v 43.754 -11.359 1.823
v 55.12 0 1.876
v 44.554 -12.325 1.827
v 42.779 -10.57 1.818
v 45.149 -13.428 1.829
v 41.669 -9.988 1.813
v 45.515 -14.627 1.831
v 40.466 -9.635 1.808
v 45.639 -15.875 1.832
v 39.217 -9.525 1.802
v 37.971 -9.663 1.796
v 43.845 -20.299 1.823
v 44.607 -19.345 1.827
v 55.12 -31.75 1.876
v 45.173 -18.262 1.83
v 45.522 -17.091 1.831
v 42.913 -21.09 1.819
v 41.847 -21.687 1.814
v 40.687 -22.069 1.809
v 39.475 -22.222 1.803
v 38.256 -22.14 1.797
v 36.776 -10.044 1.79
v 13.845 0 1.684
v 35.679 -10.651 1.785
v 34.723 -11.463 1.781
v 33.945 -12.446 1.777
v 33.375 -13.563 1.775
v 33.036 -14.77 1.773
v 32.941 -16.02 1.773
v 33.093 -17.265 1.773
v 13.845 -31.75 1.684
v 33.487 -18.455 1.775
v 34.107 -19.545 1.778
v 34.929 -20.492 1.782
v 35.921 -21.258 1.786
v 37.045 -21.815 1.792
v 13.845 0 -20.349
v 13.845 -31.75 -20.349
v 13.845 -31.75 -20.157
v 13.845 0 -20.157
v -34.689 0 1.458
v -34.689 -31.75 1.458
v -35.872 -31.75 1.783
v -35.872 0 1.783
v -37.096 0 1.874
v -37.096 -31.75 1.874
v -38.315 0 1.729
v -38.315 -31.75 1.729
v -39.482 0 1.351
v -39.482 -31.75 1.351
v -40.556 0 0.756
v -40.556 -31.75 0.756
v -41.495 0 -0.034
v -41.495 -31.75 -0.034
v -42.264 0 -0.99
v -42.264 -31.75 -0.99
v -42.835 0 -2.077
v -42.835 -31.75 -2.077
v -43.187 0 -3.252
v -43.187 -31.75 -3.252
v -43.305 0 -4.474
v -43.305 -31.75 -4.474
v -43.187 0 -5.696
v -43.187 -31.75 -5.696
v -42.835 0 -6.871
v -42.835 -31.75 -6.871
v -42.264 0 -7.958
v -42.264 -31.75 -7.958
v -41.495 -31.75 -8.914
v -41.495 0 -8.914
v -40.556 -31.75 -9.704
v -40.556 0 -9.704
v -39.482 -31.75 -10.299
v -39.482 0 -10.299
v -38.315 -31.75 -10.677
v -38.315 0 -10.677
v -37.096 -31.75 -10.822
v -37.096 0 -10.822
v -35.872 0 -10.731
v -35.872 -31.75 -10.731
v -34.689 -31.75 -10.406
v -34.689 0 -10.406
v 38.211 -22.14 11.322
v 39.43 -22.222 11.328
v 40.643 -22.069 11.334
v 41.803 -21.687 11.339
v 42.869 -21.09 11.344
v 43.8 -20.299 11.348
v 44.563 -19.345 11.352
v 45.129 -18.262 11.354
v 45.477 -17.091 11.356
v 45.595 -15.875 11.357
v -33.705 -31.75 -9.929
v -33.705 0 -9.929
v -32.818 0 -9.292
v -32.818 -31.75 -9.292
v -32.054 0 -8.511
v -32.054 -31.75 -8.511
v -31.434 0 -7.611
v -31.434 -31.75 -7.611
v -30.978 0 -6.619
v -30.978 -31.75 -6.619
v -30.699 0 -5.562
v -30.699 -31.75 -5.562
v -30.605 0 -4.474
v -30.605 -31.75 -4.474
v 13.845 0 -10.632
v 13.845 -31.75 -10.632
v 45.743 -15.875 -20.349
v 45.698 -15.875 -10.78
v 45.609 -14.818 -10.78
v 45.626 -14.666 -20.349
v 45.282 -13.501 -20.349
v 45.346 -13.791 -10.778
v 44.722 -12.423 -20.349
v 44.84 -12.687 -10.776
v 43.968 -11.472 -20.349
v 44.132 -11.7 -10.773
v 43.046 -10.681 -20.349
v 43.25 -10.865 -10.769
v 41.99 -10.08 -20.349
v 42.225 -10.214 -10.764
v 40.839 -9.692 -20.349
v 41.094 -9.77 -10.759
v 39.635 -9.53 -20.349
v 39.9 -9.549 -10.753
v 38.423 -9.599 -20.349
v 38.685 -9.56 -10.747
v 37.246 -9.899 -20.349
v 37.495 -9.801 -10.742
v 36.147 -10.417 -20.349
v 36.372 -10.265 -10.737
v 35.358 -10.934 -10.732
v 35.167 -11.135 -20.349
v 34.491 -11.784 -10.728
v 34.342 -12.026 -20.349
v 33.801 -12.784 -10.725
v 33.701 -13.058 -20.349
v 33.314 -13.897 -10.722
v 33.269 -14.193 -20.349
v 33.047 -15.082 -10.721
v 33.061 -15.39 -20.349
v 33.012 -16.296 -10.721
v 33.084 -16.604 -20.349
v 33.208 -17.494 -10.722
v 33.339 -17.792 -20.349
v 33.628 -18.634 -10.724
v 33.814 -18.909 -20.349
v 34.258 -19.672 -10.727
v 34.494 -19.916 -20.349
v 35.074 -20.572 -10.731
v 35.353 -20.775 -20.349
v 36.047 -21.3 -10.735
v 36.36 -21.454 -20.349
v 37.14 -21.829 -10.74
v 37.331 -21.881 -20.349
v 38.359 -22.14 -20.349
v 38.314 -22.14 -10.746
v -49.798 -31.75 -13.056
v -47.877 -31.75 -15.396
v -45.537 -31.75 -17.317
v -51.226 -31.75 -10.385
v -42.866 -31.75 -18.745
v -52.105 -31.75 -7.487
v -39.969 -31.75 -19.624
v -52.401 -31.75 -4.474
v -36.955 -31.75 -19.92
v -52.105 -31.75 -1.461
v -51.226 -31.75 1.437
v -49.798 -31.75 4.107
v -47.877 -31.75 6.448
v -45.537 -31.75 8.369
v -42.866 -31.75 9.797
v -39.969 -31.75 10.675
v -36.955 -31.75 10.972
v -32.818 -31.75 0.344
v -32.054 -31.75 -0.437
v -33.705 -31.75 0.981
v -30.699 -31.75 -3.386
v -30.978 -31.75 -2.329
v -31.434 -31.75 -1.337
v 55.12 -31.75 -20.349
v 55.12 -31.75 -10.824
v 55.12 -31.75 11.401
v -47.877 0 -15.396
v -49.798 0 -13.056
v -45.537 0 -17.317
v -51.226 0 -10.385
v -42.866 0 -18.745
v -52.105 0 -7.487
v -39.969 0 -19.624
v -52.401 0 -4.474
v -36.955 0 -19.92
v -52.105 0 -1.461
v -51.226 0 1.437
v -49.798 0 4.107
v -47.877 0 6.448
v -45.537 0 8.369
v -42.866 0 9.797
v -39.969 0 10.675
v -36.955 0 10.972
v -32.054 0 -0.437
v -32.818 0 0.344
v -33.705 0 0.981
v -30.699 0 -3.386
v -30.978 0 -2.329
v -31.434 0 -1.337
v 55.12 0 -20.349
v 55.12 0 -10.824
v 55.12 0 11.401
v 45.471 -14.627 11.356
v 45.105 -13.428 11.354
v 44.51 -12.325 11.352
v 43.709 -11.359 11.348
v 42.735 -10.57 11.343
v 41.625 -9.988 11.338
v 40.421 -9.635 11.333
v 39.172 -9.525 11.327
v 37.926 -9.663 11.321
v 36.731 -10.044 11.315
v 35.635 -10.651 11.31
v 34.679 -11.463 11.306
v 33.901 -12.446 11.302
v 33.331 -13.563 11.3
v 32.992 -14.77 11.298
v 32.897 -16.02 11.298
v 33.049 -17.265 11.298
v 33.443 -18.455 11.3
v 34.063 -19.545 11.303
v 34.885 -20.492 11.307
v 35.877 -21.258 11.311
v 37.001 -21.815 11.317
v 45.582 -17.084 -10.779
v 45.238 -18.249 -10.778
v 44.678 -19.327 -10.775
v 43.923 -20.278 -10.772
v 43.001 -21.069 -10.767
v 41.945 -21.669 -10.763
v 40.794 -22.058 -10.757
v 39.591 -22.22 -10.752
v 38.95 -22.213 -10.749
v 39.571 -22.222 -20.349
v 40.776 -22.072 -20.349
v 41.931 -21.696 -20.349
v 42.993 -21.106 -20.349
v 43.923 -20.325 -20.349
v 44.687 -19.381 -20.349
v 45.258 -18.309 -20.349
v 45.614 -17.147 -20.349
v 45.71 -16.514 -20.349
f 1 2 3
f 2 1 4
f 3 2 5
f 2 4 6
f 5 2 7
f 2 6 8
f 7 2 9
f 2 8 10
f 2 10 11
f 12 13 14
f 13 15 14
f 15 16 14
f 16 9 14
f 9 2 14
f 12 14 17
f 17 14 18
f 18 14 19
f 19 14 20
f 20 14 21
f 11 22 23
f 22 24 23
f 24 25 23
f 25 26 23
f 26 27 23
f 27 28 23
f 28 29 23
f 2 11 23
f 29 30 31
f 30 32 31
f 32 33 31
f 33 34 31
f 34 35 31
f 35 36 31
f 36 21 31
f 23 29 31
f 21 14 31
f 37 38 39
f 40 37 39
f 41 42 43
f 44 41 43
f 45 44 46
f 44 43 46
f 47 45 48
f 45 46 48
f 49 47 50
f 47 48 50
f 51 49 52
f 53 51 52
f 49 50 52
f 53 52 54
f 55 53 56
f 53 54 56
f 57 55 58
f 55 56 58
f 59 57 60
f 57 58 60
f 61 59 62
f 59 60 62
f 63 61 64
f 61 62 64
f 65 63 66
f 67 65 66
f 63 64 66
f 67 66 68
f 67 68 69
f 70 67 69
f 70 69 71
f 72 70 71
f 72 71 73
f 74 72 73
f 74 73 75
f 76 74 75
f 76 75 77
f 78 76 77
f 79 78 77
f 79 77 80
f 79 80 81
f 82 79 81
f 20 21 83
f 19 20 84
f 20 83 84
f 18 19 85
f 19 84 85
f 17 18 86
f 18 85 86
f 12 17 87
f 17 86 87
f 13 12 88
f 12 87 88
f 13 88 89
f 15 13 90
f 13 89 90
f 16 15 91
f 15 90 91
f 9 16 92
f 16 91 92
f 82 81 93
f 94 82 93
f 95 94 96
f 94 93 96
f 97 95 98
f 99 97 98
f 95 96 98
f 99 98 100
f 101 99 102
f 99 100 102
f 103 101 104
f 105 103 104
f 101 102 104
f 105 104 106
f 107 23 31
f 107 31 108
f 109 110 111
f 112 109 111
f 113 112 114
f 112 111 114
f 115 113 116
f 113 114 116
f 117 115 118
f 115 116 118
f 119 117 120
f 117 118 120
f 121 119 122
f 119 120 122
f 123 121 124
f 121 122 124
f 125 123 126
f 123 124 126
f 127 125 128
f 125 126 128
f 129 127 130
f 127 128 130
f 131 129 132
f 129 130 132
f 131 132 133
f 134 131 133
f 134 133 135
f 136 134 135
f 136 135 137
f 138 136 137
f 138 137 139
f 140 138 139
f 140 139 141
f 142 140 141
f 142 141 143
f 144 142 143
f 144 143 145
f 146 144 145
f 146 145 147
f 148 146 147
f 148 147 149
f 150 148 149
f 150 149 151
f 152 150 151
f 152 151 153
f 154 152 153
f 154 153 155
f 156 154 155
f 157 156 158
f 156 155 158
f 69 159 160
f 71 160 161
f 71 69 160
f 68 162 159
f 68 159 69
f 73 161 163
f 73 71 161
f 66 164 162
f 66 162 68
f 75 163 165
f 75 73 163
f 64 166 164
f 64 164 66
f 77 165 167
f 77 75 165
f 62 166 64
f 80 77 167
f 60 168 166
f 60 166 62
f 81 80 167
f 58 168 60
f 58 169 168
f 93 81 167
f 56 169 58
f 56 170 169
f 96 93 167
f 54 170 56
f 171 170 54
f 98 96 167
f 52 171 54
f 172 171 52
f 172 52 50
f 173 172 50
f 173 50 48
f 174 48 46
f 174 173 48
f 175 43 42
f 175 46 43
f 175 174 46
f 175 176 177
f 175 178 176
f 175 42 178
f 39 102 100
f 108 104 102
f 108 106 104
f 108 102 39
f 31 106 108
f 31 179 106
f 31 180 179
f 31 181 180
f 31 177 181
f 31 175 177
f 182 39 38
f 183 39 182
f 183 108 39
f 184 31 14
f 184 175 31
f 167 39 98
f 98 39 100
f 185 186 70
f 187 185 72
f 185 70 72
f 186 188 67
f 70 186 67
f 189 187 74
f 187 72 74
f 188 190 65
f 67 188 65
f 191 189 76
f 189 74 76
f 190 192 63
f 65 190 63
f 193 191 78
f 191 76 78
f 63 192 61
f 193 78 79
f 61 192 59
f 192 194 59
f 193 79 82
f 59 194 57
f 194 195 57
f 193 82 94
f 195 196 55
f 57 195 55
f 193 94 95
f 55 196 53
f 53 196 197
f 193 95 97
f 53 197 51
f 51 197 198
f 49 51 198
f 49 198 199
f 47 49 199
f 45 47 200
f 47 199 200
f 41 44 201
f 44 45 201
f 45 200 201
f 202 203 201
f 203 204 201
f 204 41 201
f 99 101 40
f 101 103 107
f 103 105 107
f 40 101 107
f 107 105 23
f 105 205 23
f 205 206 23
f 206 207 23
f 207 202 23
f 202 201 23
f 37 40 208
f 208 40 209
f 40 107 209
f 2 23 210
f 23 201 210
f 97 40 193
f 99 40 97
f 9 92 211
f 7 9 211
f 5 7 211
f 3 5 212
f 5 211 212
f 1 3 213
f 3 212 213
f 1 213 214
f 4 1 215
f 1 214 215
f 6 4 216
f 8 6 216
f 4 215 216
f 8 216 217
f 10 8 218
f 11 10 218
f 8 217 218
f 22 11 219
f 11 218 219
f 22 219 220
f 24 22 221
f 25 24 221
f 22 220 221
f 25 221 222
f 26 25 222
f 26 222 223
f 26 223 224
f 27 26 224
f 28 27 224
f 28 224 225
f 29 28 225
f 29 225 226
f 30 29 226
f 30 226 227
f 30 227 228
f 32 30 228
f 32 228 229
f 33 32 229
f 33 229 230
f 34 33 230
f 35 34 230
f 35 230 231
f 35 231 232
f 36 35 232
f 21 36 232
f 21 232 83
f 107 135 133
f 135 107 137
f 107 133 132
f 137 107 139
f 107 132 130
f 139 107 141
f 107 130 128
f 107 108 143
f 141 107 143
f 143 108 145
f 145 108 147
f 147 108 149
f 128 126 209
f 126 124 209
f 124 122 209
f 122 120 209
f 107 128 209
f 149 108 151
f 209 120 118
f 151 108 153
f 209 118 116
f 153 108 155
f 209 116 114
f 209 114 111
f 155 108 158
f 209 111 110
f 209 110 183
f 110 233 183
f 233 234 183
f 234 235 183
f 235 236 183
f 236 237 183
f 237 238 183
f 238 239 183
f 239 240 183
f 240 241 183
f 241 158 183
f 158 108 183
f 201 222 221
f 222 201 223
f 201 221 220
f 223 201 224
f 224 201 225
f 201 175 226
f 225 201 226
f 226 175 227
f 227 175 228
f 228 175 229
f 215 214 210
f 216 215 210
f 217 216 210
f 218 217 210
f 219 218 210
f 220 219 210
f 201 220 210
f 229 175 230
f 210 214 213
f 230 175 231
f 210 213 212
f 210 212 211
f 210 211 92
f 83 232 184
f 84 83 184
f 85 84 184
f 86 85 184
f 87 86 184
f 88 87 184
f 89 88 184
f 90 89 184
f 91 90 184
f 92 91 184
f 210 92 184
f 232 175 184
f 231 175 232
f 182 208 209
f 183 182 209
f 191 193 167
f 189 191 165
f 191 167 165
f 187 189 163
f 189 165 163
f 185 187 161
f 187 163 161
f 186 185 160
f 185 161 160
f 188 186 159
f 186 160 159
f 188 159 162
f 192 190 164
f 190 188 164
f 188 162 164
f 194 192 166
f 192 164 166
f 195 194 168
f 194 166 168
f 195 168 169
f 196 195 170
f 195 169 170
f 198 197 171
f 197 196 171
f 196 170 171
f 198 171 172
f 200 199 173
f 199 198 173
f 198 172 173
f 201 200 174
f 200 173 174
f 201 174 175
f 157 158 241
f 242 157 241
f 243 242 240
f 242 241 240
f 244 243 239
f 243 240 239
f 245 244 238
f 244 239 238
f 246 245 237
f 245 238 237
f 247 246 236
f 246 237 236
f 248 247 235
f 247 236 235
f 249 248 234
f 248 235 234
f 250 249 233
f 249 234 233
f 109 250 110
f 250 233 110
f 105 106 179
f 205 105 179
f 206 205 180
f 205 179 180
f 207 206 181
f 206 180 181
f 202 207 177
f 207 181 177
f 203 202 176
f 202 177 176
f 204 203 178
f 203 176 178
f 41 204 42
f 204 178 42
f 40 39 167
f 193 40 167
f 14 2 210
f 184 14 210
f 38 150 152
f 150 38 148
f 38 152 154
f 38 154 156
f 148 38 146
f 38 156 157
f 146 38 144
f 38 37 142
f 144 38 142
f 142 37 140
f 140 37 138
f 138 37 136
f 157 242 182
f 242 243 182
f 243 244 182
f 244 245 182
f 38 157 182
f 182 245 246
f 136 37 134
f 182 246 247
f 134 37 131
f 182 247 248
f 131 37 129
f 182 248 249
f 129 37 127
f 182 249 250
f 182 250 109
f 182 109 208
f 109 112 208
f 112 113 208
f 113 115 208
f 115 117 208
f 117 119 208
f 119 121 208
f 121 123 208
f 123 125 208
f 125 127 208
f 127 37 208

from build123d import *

# Parameters (mm, degrees)
F0_W     = 107.95
F0_H     = 31.75
F1_DEPTH = 31.75
F3_DEPTH = 31.751
F5_DEPTH = 31.7506558501


with BuildPart() as f1:
    # F0 (on Front) → F1 (new body)
    with BuildSketch(Plane.XZ):
        with Locations((1.144817099, -4.4740095741)):
            Rectangle(F0_W, F0_H)
    extrude(amount=F1_DEPTH)

    # F2 (on face) → F3 (cut, through all)
    with BuildSketch(Plane.XZ.offset(31.75)):
        with BuildLine():
            ThreePointArc((-34.6886992289, -10.405750614), (-31.724758859, -8.0747267722), (-30.605182901, -4.4740095741))
            ThreePointArc((-30.605182901, -4.4740095741), (-31.724758859, -0.8732923759), (-34.6886992289, 1.4577314658))
            ThreePointArc((-34.6886992289, 1.4577314658), (-43.305182901, -4.4740095741), (-34.6886992289, -10.405750614))
        make_face()
        with BuildLine():
            ThreePointArc((-36.955182901, -19.9203009288), (-52.4014742558, -4.4740095741), (-36.955182901, 10.9722817806))
            Line((-36.955182901, 10.9722817806), (55.119817099, 11.4009904259))
            Line((55.119817099, 11.4009904259), (-52.830182901, 11.4009904259))
            Line((-52.830182901, 11.4009904259), (-52.830182901, -20.3490095741))
            Line((-52.830182901, -20.3490095741), (13.844817099, -20.3490095741))
            Line((13.844817099, -20.3490095741), (13.844817099, -20.1568298366))
            Line((13.844817099, -20.1568298366), (-36.955182901, -19.9203009288))
        make_face()
        Polygon((55.119817099, -10.823906328), (55.119817099, 1.8758871798), (13.844817099, 1.6837074423), (13.844817099, -10.6317265905), align=None)
    extrude(amount=-F3_DEPTH, mode=Mode.SUBTRACT)

    # F4 (on face) → F5 (cut, through all)
    with BuildSketch(Plane(origin=(-0.051887861, 0, 11.1441065064), x_dir=(0.9999891606, 0, 0.0046560304), z_dir=(-0.0046560304, 0, 0.9999891606))):
        with BuildLine():
            ThreePointArc((38.2637782771, -22.1403273388), (43.4058074687, -20.7167652744), (45.6473029929, -15.875))
            ThreePointArc((45.6473029929, -15.875), (35.1887985171, -11.0332347256), (38.2637782771, -22.1403273388))
        make_face()
    extrude(amount=-F5_DEPTH, mode=Mode.SUBTRACT)


solid = f1.part
